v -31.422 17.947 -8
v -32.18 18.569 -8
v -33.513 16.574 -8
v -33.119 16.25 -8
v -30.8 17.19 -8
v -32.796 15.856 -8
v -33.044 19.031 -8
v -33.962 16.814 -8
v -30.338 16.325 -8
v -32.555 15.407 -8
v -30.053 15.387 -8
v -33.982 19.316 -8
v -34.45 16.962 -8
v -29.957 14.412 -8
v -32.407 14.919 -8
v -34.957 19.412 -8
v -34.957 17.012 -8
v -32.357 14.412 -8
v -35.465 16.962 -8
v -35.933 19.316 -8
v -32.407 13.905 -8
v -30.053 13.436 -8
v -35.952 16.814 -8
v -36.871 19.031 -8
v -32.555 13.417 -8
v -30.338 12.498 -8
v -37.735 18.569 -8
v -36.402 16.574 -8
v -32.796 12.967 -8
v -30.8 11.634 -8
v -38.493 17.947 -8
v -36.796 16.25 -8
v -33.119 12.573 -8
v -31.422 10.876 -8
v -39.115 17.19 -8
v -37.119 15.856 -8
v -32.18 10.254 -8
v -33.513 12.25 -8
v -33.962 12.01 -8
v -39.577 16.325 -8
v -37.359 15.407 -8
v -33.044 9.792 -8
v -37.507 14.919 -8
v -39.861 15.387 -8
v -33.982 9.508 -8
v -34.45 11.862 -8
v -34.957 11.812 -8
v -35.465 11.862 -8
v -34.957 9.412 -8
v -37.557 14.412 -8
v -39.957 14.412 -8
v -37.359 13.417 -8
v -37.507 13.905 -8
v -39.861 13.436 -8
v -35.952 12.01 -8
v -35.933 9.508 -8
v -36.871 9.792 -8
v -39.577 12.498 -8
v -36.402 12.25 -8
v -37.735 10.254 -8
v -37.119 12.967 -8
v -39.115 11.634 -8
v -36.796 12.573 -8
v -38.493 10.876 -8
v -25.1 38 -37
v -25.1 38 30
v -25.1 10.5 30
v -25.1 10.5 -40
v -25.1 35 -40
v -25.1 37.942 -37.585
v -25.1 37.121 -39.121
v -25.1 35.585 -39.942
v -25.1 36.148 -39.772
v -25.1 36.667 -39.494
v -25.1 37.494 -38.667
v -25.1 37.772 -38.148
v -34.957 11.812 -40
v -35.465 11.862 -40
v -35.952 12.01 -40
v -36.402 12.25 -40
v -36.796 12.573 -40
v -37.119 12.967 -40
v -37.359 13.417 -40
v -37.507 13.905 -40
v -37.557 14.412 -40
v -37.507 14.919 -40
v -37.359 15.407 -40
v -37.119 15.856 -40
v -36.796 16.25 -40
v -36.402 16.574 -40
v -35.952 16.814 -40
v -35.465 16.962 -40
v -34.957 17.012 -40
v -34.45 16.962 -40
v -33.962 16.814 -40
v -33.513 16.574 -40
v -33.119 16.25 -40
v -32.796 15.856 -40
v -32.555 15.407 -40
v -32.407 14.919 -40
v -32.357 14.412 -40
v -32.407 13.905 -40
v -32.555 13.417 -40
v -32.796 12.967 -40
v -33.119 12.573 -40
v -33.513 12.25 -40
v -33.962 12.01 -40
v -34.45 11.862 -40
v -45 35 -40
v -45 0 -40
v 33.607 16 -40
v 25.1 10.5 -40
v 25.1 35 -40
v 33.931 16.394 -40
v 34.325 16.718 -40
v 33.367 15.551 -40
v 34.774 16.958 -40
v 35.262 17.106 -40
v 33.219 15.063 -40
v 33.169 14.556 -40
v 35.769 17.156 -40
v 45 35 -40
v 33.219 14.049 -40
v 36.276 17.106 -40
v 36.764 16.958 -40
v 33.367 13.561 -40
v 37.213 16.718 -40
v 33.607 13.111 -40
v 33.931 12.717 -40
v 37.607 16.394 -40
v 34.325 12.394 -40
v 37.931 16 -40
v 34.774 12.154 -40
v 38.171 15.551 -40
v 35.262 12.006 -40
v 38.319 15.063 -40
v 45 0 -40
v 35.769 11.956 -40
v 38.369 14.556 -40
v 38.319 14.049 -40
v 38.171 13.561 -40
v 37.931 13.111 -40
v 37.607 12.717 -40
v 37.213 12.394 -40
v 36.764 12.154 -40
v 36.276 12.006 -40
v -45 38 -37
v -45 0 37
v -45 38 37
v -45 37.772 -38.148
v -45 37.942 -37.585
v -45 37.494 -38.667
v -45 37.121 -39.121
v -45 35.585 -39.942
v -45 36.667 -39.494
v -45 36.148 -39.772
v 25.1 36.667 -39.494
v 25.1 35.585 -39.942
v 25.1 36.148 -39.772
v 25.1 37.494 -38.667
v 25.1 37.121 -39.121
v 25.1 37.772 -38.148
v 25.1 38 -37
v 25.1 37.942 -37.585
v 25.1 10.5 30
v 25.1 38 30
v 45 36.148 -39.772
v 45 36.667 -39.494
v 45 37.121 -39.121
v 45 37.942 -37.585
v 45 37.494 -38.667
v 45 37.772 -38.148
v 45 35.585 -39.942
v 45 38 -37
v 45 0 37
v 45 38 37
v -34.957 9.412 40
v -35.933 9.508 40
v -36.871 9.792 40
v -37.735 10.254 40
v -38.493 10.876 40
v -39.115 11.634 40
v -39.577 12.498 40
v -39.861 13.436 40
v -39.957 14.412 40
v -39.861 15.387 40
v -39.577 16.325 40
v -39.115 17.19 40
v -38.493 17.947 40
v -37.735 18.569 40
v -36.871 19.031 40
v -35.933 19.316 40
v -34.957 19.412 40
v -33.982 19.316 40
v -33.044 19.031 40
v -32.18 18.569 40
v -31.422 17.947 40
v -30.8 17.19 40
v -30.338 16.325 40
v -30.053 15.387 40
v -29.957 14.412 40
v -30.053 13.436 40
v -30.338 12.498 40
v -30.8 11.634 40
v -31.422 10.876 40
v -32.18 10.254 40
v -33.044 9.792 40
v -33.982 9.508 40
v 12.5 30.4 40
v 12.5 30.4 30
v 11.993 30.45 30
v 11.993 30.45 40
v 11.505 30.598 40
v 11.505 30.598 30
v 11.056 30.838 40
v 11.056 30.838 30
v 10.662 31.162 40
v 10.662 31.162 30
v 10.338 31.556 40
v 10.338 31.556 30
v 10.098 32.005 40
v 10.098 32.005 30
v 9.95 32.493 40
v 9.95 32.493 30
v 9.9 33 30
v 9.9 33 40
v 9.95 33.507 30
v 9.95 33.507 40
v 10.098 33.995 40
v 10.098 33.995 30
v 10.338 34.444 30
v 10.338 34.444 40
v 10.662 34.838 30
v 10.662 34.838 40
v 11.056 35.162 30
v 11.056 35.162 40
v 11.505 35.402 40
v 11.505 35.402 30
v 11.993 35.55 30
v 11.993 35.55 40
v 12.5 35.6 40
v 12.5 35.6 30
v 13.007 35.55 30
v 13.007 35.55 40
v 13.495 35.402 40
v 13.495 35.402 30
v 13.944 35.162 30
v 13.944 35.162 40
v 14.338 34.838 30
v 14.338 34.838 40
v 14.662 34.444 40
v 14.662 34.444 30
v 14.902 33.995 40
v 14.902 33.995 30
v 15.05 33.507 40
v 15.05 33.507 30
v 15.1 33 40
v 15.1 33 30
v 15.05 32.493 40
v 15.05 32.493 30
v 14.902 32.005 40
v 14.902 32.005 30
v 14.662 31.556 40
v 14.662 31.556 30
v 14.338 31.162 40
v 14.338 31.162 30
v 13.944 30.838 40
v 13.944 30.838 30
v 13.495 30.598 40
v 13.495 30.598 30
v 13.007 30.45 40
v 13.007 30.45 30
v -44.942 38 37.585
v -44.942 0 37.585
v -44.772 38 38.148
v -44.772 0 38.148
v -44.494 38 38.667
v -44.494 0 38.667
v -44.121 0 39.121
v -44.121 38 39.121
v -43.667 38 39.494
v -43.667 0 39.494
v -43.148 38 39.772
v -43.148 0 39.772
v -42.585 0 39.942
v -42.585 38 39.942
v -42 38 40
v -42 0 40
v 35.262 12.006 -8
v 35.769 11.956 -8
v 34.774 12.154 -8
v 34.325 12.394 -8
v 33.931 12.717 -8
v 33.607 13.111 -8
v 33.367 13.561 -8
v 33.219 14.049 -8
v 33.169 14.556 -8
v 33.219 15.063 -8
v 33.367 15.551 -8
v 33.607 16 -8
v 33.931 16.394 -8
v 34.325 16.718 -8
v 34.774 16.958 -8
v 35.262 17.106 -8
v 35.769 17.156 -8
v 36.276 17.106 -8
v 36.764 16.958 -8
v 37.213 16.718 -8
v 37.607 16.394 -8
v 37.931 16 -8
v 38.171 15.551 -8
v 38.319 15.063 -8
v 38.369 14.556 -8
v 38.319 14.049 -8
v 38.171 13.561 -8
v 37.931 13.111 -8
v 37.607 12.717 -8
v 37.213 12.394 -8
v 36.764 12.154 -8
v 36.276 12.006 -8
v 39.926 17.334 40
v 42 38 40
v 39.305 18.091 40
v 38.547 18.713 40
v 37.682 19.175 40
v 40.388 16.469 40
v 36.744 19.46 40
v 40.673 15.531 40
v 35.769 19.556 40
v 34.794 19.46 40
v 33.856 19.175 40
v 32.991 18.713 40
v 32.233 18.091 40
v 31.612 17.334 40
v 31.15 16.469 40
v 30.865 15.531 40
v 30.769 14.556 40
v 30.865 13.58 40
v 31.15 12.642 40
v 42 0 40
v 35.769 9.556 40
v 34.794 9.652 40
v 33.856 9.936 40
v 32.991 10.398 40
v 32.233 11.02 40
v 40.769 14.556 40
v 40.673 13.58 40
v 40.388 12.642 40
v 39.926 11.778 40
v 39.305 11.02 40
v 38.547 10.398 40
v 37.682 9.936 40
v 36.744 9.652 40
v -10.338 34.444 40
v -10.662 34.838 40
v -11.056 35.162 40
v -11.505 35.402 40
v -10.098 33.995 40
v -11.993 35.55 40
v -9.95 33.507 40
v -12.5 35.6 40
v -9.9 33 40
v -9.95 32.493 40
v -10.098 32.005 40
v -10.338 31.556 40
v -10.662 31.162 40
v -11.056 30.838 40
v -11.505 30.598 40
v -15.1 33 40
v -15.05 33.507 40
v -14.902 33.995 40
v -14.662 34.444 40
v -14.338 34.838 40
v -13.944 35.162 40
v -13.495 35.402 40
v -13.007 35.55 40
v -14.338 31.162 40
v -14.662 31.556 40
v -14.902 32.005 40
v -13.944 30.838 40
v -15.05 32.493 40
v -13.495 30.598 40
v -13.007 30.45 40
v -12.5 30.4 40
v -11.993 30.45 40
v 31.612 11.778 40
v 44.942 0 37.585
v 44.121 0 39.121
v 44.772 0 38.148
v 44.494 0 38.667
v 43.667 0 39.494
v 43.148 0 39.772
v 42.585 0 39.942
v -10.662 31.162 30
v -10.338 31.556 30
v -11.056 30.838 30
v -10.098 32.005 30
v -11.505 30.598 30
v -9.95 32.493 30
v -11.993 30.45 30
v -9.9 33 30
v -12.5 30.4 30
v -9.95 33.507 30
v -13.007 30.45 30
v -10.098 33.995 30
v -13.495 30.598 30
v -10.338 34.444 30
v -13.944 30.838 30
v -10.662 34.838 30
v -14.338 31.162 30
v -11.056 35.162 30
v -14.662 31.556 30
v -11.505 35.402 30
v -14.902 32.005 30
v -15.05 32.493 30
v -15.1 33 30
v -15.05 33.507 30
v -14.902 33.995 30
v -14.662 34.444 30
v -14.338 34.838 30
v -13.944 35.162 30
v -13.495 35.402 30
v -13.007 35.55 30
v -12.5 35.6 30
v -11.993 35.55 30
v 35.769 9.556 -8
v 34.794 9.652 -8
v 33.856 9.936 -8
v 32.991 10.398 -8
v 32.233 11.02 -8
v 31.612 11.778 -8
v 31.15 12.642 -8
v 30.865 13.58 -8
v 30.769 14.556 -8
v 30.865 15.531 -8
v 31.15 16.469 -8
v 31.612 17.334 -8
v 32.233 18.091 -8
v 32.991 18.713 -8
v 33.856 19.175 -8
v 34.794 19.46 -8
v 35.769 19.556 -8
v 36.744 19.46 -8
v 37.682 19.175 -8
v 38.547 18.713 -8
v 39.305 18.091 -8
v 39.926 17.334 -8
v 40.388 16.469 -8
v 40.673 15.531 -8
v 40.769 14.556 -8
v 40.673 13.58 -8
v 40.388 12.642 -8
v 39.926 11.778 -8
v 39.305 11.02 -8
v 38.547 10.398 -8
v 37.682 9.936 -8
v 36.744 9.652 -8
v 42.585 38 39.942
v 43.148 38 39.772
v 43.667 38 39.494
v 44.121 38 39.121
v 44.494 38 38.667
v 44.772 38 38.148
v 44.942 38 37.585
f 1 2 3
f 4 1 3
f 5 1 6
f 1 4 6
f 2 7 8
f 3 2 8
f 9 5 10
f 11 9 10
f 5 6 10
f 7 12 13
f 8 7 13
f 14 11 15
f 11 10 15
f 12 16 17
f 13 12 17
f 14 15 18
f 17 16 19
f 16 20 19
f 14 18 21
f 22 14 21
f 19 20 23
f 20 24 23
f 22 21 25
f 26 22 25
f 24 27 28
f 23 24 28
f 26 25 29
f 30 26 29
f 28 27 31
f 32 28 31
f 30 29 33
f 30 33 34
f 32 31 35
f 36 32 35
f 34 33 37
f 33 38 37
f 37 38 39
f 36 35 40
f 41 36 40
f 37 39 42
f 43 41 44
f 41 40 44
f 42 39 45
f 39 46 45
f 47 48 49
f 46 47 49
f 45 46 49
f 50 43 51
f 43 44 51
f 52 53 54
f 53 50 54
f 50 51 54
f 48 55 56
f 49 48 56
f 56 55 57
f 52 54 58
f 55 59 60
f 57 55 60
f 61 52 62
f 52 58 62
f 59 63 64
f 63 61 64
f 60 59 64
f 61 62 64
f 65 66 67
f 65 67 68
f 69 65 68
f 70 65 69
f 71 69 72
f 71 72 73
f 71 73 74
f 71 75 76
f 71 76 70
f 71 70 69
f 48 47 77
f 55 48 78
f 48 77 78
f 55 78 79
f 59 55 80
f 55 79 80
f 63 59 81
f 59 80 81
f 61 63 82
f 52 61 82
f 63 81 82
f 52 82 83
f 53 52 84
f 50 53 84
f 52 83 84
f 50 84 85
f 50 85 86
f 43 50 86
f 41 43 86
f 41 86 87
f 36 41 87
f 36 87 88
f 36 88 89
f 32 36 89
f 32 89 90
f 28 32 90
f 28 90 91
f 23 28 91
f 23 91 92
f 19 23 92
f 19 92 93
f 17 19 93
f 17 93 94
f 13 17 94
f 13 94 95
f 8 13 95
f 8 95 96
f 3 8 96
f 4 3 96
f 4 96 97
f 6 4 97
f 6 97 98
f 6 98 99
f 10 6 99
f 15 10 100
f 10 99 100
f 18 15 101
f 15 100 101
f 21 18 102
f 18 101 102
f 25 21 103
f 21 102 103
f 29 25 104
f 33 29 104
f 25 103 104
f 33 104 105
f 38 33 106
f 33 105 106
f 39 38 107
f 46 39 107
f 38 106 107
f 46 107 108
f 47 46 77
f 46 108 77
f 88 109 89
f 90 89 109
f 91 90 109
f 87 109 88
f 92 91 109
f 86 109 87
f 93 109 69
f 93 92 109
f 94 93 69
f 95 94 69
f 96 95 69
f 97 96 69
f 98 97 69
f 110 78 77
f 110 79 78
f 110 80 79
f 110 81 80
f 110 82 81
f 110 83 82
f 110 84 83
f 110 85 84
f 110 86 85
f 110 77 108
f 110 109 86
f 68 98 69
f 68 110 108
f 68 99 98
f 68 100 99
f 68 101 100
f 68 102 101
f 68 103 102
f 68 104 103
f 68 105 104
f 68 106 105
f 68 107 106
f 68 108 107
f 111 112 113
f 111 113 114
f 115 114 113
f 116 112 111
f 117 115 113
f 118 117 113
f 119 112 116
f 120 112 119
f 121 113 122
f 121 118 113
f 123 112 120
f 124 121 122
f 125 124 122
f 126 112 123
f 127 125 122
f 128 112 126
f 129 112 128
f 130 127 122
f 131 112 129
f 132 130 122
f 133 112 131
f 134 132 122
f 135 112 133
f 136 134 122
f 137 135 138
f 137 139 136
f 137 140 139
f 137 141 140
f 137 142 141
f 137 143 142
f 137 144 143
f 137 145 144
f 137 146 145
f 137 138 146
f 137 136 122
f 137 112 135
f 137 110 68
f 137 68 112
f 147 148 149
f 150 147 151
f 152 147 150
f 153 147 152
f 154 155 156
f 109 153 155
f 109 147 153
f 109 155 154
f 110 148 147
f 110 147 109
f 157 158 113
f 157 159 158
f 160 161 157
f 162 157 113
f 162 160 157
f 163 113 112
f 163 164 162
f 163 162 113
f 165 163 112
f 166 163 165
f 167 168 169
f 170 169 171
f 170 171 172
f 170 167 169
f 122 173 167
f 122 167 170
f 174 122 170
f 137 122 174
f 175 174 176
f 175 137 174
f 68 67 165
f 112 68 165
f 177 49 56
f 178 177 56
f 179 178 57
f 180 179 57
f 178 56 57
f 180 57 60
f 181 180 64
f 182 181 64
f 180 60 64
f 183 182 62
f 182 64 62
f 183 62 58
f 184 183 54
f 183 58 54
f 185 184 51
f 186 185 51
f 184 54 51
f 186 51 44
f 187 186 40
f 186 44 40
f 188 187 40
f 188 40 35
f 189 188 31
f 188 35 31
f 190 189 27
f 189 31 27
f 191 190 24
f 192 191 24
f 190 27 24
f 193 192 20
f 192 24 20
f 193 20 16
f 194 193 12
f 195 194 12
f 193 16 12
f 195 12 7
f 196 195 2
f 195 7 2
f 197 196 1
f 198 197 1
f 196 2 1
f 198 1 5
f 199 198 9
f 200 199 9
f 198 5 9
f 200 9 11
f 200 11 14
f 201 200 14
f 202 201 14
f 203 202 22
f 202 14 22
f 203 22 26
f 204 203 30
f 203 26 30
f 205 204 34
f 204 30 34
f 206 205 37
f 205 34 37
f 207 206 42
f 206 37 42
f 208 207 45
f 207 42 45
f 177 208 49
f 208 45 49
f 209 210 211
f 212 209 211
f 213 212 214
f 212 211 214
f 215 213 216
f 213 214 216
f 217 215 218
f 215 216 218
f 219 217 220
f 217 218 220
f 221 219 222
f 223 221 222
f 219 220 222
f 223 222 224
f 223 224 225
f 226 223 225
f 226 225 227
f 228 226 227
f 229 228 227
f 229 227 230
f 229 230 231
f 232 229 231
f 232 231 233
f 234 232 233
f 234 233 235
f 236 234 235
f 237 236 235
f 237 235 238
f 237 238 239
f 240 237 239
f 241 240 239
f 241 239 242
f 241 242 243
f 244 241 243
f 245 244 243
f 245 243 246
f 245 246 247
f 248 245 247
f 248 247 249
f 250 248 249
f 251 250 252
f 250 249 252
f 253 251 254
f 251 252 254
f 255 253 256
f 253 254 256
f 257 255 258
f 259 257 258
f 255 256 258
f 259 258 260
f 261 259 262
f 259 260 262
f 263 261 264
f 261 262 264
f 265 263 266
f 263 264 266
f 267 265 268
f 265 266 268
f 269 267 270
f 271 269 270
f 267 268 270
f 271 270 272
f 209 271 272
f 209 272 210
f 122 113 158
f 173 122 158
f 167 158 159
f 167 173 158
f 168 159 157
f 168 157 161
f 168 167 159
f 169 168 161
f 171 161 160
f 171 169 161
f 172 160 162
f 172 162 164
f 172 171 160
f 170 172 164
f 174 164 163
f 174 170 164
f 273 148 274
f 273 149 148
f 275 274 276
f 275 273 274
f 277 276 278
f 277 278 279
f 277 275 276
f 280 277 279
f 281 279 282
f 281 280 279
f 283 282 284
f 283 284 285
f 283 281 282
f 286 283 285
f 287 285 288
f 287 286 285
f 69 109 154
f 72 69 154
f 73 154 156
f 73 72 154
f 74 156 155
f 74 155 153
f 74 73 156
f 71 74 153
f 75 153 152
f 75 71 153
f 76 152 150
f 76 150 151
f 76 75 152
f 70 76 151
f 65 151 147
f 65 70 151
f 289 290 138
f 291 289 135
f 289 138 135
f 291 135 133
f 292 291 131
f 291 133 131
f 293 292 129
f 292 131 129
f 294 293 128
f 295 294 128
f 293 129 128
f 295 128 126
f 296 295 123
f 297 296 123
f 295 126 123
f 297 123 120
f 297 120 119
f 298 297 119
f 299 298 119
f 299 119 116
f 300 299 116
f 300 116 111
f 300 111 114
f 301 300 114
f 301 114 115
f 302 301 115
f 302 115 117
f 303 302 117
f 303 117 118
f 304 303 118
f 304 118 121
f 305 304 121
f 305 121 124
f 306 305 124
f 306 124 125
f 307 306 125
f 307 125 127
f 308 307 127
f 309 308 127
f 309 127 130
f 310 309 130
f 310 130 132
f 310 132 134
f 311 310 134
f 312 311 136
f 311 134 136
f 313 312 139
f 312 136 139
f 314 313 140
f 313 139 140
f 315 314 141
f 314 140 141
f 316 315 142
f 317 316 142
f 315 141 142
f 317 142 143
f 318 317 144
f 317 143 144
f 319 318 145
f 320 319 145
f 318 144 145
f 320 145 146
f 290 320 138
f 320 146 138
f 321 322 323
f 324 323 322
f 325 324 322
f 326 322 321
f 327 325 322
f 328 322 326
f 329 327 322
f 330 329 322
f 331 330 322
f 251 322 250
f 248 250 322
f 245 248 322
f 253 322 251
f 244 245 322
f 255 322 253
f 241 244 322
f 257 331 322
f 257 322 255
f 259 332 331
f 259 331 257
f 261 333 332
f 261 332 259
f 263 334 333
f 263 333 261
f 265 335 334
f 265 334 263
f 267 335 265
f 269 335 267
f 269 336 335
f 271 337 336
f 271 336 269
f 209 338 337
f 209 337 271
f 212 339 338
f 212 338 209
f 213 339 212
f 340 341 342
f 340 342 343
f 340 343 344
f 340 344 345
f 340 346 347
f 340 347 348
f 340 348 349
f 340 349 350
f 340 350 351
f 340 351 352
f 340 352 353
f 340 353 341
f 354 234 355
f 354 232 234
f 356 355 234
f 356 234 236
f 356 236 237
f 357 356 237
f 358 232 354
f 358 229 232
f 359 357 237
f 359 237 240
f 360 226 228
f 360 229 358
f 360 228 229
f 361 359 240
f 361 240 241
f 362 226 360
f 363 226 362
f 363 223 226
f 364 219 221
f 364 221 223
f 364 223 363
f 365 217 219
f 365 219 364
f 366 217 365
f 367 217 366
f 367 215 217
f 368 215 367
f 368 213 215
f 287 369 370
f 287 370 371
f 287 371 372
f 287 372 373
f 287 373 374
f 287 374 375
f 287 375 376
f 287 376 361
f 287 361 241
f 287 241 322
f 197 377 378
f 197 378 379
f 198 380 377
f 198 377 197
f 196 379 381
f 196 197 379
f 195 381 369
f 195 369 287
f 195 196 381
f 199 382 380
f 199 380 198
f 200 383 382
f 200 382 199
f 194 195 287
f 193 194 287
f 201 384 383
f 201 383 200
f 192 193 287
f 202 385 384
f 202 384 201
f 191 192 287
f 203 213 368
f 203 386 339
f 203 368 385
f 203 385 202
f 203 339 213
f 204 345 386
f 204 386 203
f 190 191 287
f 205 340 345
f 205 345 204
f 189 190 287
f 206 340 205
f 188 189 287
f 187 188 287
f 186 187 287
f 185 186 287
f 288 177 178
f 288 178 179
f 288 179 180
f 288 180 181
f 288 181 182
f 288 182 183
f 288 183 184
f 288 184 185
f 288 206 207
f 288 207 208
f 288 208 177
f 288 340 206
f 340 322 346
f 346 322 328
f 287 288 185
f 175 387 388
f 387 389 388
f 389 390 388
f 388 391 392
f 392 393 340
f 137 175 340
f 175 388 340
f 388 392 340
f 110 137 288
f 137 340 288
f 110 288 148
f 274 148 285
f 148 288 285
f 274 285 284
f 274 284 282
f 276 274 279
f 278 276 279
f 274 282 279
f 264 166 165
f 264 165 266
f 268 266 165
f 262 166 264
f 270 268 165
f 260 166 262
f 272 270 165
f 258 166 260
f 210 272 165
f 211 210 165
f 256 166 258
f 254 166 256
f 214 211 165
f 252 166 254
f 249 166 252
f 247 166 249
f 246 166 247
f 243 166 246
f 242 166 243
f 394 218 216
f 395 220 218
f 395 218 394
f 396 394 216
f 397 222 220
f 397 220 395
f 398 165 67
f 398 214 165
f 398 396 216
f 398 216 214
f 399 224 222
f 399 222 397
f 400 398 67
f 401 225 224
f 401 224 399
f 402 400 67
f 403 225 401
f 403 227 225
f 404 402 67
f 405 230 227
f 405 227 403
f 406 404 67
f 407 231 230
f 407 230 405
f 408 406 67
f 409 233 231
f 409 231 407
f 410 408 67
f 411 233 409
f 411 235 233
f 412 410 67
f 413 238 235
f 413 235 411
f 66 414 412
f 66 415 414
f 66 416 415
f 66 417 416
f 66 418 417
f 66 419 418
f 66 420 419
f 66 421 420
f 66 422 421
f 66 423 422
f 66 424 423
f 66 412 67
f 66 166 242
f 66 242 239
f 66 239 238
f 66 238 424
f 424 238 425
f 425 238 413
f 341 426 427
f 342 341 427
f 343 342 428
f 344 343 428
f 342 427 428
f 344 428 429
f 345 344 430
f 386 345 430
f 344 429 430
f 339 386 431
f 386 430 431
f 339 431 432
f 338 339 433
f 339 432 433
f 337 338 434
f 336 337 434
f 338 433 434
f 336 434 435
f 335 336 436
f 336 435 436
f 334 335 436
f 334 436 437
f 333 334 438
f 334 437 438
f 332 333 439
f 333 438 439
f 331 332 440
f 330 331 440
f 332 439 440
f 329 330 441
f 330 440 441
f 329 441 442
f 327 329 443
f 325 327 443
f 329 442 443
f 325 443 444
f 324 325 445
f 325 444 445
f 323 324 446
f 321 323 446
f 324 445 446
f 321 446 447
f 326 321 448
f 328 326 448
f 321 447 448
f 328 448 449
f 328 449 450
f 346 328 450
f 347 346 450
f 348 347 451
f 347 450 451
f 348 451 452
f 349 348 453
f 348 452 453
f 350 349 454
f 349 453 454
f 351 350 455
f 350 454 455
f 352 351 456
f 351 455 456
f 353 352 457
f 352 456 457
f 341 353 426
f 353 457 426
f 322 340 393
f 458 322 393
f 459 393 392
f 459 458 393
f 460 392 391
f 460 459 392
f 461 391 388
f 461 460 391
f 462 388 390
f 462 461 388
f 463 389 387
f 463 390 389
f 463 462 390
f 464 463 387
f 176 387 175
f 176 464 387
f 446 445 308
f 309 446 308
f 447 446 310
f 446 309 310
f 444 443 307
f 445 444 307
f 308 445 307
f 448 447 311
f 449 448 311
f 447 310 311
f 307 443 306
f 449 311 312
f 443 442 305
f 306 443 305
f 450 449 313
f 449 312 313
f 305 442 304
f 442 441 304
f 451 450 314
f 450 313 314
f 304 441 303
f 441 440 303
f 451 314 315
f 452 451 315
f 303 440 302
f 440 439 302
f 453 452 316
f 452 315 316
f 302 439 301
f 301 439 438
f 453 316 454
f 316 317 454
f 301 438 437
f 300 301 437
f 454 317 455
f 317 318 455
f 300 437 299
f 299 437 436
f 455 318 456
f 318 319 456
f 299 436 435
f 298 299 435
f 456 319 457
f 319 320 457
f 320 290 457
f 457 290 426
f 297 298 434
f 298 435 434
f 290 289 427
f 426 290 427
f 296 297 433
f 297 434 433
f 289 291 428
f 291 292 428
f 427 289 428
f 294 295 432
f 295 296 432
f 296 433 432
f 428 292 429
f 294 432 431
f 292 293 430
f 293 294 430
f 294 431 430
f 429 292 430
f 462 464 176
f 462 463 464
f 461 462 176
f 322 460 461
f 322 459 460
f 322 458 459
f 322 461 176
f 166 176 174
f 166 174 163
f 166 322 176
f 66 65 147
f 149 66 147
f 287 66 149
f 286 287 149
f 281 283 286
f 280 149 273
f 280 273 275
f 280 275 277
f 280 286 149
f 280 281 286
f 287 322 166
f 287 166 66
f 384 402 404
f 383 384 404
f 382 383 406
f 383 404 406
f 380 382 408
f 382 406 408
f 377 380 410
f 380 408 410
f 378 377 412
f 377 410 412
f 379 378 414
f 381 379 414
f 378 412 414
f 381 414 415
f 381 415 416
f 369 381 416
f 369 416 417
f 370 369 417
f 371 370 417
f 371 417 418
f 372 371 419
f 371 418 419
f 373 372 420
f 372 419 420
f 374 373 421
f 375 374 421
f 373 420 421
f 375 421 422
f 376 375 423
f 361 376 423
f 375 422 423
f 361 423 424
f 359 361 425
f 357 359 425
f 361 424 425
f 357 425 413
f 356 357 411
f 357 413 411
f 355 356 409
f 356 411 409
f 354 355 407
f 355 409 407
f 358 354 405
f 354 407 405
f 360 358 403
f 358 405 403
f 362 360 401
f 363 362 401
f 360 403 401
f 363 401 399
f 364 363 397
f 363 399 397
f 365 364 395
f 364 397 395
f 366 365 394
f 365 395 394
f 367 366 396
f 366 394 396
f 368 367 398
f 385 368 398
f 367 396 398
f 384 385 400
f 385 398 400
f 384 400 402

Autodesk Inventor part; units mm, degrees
ref_plane "YZ Plane" through (0, 0, 0) normal (1, 0, 0) x (0, 1, 0)
ref_plane "XZ Plane" through (0, 0, 0) normal (0, 1, 0) x (-1, 0, 0)
ref_plane "XY Plane" through (0, 0, 0) normal (0, 0, 1) x (1, 0, 0)
sketch "Sketch1" plane through (0, 0, 0) normal (0, 1, 0) x (-1, 0, 0)
  line L0 (45, -40) -> (-45, -40)
  line L1 (-45, -40) -> (-45, 40)
  line L2 (-45, 40) -> (45, 40)
  line L3 (45, 40) -> (45, -40)
  line L4 (45, -40) -> (-45, 40) construction
  line L5 (-45, -40) -> (45, 40) construction
  point P0 (0, 0)
  dimension "d0" = 90
  dimension "d1" = 80
extrude "Extrusion1" add sketch "Sketch1" along normal blind 38
sketch "Sketch2" plane through (0, 38, 0) normal (0, 1, 0) x (1, 0, 0)
  line L0 (-45, -40) -> (45, -40) projected
  line L1 (45, -40) -> (45, 40) projected
  line L2 (45, 40) -> (-45, 40) projected
  line L3 (-45, 40) -> (-45, -40) projected
  line L4 (-25.1, 40) -> (25.1, 40)
  line L5 (25.1, 40) -> (25.1, 20)
  line L6 (25.1, 20) -> (-25.1, 20)
  line L7 (-25.1, 20) -> (-25.1, 40)
  line L8 (-25.1, 20) -> (25.1, 20)
  line L9 (25.1, 20) -> (25.1, -30)
  line L10 (25.1, -30) -> (-25.1, -30)
  line L11 (-25.1, -30) -> (-25.1, 20)
  point P0 (0, 0)
  point P1 (0, 40)
  dimension "d4" = 50.2
  dimension "d5" = 20
  dimension "d24" = 50
extrude "Extrusion2" cut sketch "Sketch2" against normal blind 27.5 contours L2 L5 L6 L7 | L6 L9 L10 L11
sketch "Sketch3" plane through (-45, 0, 40) normal (0, 0, 1) x (1, 0, 0)
  circle A0 centre (32.5, 33) radius 2.067 construction
  circle A1 centre (57.5, 33) radius 2.067 construction
  line L0 (0, 0) -> (90, 0) construction
  line L1 (90, 0) -> (90, 38) construction
  line L2 (0, 38) -> (90, 38) construction
  line L3 (0, 0) -> (0, 38) construction
  line L4 (0, 15) -> (90, 15) construction
  line L5 (45, 0) -> (45, 38) construction
  point P0 (10, 15)
  point P1 (80, 15)
  dimension "d8" = 15
  dimension "d9" = 10
hole "Hole1" at (-12.5, 33, 40) at (12.5, 33, 40) direction (0, 0, -1) diameter 5.2 end through all
sketch "Sketch4" plane through (-45, 0, 40) normal (0, 0, 1) x (1, 0, 0)
  point P0 (45, 0)
  point P1 (10.0426, 14.4118)
  point P2 (80.769, 14.5558)
hole "Hole2" at (-34.9574, 14.4118, 40) at (35.769, 14.5558, 40) direction (0, 0, -1) diameter 5.2 end through all counterbore diameter 10 counterbore depth 48
fillet "Fillet1" radius 3 4 edges at (-45, 19, 40) (45, 19, 40) (35.05, 38, -40) (-35.05, 38, -40)
properties part number "T-Frame_encoder_frame" material "ABS Plastic"
